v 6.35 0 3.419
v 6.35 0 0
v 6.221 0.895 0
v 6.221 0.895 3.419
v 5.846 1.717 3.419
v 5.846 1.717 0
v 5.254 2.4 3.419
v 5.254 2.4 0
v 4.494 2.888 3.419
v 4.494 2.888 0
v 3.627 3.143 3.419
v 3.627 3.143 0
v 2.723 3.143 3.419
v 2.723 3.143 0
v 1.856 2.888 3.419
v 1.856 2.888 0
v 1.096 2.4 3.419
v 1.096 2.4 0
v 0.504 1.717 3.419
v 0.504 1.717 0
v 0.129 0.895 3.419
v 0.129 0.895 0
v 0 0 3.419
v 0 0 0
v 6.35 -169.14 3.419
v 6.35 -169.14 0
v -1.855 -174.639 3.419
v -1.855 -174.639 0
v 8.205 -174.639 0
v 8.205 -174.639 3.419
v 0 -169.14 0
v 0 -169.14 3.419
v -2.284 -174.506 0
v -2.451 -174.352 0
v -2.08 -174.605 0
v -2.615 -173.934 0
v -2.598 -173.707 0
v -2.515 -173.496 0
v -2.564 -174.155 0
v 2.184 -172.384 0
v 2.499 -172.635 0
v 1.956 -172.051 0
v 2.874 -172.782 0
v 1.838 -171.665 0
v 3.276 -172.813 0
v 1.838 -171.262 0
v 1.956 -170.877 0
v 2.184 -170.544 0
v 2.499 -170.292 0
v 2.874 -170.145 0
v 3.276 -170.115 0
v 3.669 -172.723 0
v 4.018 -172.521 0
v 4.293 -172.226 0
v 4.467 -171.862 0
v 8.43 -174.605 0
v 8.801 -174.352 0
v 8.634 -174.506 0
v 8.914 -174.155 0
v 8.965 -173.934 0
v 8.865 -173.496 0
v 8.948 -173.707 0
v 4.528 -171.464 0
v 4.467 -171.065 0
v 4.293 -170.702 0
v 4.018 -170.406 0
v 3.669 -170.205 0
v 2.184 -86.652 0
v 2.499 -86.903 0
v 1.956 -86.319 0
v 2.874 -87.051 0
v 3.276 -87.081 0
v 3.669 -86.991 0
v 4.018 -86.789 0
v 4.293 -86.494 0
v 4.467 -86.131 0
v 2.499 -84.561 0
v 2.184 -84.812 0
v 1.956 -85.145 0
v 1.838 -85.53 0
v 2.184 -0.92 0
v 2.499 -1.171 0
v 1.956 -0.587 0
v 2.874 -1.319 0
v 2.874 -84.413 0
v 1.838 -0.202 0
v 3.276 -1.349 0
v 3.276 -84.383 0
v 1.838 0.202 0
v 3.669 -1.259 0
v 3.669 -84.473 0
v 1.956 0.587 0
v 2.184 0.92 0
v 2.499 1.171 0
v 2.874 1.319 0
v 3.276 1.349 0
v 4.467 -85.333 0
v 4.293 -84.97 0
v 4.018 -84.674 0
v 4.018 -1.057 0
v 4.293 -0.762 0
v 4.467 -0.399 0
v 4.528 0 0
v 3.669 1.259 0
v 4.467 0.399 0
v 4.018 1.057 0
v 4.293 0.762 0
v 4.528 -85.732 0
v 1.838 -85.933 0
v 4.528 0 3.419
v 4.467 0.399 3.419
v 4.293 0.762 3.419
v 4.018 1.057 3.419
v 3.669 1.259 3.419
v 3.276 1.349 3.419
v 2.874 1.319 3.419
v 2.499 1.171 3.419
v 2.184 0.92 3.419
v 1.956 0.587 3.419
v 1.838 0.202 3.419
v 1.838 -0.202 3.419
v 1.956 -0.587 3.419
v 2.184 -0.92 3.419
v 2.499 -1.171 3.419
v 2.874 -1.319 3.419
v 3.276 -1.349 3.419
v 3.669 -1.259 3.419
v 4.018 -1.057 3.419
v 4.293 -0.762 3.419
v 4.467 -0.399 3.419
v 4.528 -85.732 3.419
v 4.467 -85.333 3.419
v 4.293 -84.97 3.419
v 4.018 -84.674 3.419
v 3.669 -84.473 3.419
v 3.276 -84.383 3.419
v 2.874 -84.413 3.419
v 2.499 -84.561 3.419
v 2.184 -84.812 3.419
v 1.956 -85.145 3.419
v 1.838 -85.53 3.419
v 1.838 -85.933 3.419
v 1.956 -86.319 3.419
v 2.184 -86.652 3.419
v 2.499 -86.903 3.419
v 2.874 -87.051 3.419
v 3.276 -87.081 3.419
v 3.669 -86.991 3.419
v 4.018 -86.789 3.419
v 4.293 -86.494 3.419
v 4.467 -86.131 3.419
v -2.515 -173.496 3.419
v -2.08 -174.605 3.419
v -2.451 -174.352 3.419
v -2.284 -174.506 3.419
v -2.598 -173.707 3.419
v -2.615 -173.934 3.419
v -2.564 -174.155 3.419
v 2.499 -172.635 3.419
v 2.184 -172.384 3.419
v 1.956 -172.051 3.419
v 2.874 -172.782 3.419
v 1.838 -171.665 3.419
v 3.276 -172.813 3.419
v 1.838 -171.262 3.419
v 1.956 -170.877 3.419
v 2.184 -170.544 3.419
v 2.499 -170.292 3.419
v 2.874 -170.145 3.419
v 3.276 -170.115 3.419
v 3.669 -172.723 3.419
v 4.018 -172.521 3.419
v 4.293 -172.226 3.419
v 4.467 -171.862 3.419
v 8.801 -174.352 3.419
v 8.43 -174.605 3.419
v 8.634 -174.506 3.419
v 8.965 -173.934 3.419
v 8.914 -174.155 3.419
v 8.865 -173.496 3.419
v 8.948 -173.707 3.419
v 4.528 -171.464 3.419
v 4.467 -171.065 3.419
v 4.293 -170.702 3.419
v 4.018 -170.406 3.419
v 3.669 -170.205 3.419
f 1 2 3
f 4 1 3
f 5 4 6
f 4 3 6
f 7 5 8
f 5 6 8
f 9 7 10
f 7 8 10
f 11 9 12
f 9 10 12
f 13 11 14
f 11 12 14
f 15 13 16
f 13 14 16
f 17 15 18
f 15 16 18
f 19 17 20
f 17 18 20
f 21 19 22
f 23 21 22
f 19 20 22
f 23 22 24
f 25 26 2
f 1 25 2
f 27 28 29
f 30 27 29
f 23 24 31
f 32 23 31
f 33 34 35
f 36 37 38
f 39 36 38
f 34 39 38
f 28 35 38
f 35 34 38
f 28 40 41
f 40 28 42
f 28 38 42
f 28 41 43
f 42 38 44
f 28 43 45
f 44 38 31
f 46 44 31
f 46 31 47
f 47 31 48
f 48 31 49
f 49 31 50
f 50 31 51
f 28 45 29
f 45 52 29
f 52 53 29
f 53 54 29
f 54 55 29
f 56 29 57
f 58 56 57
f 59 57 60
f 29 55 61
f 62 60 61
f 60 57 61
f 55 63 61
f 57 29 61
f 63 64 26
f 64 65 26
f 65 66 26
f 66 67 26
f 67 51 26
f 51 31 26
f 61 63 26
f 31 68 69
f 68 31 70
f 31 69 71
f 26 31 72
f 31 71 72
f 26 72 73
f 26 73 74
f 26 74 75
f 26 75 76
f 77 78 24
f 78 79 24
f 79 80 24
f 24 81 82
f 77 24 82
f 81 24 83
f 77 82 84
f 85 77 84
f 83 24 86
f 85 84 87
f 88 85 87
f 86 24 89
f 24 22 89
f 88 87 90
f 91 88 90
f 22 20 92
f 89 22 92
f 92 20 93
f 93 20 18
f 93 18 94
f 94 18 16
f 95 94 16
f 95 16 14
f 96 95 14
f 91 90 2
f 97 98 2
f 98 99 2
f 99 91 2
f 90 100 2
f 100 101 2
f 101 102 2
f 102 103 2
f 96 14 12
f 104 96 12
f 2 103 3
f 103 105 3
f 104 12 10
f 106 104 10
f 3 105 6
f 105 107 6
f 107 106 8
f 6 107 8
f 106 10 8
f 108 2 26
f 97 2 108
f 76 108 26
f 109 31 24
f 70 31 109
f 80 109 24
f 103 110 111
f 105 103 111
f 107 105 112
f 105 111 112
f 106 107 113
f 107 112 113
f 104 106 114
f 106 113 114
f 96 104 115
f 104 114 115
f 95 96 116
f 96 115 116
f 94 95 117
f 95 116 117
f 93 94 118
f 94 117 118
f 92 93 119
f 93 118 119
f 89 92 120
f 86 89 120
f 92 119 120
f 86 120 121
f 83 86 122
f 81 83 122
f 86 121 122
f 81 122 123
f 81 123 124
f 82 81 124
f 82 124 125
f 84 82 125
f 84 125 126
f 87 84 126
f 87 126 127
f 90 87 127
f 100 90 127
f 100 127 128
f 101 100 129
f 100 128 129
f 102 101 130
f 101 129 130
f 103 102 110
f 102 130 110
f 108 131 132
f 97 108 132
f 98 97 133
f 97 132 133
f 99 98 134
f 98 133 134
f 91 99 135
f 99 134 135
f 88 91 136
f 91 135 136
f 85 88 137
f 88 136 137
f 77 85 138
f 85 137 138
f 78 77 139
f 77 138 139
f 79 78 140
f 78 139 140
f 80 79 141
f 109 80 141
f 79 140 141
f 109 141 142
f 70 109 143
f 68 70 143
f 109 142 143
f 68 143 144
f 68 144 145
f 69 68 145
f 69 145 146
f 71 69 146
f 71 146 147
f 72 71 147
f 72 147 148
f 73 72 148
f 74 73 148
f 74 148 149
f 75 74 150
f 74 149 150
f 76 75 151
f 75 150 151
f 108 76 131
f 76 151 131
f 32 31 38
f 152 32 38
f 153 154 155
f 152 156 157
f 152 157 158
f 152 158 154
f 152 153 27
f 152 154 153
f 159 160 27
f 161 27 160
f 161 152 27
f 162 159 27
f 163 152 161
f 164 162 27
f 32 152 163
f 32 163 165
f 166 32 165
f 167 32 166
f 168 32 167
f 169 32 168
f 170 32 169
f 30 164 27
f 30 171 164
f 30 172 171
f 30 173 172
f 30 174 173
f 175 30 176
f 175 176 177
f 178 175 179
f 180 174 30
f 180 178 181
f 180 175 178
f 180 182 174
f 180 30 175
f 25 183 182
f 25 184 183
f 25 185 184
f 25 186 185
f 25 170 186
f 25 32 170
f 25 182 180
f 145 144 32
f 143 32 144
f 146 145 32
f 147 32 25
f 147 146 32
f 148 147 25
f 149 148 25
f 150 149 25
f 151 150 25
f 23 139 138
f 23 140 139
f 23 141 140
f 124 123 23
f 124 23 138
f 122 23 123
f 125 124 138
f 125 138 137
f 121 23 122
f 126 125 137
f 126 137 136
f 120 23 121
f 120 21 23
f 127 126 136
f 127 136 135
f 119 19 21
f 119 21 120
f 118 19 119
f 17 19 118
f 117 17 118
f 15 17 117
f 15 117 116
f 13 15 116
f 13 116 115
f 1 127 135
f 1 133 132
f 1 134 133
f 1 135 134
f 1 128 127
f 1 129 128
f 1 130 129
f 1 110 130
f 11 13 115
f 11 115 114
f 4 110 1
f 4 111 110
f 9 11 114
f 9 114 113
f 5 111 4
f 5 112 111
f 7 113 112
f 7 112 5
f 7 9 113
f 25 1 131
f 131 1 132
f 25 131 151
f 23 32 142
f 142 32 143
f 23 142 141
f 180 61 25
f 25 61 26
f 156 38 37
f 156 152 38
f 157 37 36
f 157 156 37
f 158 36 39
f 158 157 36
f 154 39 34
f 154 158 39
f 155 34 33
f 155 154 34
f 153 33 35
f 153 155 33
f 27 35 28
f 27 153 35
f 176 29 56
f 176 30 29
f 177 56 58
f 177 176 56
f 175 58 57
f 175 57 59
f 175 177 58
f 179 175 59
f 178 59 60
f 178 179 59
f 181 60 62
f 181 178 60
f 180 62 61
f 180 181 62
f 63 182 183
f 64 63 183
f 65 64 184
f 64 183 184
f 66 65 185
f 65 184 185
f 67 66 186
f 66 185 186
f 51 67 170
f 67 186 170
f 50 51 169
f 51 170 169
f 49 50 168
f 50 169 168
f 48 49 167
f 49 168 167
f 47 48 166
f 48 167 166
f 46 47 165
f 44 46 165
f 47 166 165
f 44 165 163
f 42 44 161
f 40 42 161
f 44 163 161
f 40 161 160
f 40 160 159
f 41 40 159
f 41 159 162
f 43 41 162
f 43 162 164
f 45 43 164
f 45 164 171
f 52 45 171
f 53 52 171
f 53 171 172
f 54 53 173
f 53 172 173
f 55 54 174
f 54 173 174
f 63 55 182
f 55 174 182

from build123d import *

# Parameters (mm, degrees)
F1_DEPTH = 3.41884
F2_R     = 0.762
F3_R     = 1.35255
F4_DEPTH = 3.41884


with BuildPart() as f1:
    # F0 (on Top) → F1 (new body)
    with BuildSketch(Plane.XY):
        with BuildLine():
            ThreePointArc((6.35, 0), (3.175, 3.175), (0, 0))
            Line((0, 0), (0, -169.139565))
            Line((0, -169.139565), (-3.174995, -174.638818))
            Line((-3.174995, -174.638818), (9.524995, -174.638818))
            Line((9.524995, -174.638818), (6.35, -169.139565))
            Line((6.35, -169.139565), (6.35, 0))
        make_face()
    extrude(amount=F1_DEPTH)

    # F2
    f2_edges = [f1.edges().sort_by_distance(p)[0] for p in [
        (9.524995, -174.638818, 1.70942),
        (-3.174995, -174.638818, 1.70942),
    ]]
    fillet(f2_edges, radius=F2_R)

    # F3 (on face) → F4 (cut, through all)
    with BuildSketch(Plane.XY.offset(3.41884)):
        with Locations((3.175, 0)):
            Circle(F3_R)
        with Locations((3.175, -85.731909)):
            Circle(F3_R)
        with Locations((3.175, -171.463818)):
            Circle(F3_R)
    extrude(amount=-F4_DEPTH, mode=Mode.SUBTRACT)


solid = f1.part
